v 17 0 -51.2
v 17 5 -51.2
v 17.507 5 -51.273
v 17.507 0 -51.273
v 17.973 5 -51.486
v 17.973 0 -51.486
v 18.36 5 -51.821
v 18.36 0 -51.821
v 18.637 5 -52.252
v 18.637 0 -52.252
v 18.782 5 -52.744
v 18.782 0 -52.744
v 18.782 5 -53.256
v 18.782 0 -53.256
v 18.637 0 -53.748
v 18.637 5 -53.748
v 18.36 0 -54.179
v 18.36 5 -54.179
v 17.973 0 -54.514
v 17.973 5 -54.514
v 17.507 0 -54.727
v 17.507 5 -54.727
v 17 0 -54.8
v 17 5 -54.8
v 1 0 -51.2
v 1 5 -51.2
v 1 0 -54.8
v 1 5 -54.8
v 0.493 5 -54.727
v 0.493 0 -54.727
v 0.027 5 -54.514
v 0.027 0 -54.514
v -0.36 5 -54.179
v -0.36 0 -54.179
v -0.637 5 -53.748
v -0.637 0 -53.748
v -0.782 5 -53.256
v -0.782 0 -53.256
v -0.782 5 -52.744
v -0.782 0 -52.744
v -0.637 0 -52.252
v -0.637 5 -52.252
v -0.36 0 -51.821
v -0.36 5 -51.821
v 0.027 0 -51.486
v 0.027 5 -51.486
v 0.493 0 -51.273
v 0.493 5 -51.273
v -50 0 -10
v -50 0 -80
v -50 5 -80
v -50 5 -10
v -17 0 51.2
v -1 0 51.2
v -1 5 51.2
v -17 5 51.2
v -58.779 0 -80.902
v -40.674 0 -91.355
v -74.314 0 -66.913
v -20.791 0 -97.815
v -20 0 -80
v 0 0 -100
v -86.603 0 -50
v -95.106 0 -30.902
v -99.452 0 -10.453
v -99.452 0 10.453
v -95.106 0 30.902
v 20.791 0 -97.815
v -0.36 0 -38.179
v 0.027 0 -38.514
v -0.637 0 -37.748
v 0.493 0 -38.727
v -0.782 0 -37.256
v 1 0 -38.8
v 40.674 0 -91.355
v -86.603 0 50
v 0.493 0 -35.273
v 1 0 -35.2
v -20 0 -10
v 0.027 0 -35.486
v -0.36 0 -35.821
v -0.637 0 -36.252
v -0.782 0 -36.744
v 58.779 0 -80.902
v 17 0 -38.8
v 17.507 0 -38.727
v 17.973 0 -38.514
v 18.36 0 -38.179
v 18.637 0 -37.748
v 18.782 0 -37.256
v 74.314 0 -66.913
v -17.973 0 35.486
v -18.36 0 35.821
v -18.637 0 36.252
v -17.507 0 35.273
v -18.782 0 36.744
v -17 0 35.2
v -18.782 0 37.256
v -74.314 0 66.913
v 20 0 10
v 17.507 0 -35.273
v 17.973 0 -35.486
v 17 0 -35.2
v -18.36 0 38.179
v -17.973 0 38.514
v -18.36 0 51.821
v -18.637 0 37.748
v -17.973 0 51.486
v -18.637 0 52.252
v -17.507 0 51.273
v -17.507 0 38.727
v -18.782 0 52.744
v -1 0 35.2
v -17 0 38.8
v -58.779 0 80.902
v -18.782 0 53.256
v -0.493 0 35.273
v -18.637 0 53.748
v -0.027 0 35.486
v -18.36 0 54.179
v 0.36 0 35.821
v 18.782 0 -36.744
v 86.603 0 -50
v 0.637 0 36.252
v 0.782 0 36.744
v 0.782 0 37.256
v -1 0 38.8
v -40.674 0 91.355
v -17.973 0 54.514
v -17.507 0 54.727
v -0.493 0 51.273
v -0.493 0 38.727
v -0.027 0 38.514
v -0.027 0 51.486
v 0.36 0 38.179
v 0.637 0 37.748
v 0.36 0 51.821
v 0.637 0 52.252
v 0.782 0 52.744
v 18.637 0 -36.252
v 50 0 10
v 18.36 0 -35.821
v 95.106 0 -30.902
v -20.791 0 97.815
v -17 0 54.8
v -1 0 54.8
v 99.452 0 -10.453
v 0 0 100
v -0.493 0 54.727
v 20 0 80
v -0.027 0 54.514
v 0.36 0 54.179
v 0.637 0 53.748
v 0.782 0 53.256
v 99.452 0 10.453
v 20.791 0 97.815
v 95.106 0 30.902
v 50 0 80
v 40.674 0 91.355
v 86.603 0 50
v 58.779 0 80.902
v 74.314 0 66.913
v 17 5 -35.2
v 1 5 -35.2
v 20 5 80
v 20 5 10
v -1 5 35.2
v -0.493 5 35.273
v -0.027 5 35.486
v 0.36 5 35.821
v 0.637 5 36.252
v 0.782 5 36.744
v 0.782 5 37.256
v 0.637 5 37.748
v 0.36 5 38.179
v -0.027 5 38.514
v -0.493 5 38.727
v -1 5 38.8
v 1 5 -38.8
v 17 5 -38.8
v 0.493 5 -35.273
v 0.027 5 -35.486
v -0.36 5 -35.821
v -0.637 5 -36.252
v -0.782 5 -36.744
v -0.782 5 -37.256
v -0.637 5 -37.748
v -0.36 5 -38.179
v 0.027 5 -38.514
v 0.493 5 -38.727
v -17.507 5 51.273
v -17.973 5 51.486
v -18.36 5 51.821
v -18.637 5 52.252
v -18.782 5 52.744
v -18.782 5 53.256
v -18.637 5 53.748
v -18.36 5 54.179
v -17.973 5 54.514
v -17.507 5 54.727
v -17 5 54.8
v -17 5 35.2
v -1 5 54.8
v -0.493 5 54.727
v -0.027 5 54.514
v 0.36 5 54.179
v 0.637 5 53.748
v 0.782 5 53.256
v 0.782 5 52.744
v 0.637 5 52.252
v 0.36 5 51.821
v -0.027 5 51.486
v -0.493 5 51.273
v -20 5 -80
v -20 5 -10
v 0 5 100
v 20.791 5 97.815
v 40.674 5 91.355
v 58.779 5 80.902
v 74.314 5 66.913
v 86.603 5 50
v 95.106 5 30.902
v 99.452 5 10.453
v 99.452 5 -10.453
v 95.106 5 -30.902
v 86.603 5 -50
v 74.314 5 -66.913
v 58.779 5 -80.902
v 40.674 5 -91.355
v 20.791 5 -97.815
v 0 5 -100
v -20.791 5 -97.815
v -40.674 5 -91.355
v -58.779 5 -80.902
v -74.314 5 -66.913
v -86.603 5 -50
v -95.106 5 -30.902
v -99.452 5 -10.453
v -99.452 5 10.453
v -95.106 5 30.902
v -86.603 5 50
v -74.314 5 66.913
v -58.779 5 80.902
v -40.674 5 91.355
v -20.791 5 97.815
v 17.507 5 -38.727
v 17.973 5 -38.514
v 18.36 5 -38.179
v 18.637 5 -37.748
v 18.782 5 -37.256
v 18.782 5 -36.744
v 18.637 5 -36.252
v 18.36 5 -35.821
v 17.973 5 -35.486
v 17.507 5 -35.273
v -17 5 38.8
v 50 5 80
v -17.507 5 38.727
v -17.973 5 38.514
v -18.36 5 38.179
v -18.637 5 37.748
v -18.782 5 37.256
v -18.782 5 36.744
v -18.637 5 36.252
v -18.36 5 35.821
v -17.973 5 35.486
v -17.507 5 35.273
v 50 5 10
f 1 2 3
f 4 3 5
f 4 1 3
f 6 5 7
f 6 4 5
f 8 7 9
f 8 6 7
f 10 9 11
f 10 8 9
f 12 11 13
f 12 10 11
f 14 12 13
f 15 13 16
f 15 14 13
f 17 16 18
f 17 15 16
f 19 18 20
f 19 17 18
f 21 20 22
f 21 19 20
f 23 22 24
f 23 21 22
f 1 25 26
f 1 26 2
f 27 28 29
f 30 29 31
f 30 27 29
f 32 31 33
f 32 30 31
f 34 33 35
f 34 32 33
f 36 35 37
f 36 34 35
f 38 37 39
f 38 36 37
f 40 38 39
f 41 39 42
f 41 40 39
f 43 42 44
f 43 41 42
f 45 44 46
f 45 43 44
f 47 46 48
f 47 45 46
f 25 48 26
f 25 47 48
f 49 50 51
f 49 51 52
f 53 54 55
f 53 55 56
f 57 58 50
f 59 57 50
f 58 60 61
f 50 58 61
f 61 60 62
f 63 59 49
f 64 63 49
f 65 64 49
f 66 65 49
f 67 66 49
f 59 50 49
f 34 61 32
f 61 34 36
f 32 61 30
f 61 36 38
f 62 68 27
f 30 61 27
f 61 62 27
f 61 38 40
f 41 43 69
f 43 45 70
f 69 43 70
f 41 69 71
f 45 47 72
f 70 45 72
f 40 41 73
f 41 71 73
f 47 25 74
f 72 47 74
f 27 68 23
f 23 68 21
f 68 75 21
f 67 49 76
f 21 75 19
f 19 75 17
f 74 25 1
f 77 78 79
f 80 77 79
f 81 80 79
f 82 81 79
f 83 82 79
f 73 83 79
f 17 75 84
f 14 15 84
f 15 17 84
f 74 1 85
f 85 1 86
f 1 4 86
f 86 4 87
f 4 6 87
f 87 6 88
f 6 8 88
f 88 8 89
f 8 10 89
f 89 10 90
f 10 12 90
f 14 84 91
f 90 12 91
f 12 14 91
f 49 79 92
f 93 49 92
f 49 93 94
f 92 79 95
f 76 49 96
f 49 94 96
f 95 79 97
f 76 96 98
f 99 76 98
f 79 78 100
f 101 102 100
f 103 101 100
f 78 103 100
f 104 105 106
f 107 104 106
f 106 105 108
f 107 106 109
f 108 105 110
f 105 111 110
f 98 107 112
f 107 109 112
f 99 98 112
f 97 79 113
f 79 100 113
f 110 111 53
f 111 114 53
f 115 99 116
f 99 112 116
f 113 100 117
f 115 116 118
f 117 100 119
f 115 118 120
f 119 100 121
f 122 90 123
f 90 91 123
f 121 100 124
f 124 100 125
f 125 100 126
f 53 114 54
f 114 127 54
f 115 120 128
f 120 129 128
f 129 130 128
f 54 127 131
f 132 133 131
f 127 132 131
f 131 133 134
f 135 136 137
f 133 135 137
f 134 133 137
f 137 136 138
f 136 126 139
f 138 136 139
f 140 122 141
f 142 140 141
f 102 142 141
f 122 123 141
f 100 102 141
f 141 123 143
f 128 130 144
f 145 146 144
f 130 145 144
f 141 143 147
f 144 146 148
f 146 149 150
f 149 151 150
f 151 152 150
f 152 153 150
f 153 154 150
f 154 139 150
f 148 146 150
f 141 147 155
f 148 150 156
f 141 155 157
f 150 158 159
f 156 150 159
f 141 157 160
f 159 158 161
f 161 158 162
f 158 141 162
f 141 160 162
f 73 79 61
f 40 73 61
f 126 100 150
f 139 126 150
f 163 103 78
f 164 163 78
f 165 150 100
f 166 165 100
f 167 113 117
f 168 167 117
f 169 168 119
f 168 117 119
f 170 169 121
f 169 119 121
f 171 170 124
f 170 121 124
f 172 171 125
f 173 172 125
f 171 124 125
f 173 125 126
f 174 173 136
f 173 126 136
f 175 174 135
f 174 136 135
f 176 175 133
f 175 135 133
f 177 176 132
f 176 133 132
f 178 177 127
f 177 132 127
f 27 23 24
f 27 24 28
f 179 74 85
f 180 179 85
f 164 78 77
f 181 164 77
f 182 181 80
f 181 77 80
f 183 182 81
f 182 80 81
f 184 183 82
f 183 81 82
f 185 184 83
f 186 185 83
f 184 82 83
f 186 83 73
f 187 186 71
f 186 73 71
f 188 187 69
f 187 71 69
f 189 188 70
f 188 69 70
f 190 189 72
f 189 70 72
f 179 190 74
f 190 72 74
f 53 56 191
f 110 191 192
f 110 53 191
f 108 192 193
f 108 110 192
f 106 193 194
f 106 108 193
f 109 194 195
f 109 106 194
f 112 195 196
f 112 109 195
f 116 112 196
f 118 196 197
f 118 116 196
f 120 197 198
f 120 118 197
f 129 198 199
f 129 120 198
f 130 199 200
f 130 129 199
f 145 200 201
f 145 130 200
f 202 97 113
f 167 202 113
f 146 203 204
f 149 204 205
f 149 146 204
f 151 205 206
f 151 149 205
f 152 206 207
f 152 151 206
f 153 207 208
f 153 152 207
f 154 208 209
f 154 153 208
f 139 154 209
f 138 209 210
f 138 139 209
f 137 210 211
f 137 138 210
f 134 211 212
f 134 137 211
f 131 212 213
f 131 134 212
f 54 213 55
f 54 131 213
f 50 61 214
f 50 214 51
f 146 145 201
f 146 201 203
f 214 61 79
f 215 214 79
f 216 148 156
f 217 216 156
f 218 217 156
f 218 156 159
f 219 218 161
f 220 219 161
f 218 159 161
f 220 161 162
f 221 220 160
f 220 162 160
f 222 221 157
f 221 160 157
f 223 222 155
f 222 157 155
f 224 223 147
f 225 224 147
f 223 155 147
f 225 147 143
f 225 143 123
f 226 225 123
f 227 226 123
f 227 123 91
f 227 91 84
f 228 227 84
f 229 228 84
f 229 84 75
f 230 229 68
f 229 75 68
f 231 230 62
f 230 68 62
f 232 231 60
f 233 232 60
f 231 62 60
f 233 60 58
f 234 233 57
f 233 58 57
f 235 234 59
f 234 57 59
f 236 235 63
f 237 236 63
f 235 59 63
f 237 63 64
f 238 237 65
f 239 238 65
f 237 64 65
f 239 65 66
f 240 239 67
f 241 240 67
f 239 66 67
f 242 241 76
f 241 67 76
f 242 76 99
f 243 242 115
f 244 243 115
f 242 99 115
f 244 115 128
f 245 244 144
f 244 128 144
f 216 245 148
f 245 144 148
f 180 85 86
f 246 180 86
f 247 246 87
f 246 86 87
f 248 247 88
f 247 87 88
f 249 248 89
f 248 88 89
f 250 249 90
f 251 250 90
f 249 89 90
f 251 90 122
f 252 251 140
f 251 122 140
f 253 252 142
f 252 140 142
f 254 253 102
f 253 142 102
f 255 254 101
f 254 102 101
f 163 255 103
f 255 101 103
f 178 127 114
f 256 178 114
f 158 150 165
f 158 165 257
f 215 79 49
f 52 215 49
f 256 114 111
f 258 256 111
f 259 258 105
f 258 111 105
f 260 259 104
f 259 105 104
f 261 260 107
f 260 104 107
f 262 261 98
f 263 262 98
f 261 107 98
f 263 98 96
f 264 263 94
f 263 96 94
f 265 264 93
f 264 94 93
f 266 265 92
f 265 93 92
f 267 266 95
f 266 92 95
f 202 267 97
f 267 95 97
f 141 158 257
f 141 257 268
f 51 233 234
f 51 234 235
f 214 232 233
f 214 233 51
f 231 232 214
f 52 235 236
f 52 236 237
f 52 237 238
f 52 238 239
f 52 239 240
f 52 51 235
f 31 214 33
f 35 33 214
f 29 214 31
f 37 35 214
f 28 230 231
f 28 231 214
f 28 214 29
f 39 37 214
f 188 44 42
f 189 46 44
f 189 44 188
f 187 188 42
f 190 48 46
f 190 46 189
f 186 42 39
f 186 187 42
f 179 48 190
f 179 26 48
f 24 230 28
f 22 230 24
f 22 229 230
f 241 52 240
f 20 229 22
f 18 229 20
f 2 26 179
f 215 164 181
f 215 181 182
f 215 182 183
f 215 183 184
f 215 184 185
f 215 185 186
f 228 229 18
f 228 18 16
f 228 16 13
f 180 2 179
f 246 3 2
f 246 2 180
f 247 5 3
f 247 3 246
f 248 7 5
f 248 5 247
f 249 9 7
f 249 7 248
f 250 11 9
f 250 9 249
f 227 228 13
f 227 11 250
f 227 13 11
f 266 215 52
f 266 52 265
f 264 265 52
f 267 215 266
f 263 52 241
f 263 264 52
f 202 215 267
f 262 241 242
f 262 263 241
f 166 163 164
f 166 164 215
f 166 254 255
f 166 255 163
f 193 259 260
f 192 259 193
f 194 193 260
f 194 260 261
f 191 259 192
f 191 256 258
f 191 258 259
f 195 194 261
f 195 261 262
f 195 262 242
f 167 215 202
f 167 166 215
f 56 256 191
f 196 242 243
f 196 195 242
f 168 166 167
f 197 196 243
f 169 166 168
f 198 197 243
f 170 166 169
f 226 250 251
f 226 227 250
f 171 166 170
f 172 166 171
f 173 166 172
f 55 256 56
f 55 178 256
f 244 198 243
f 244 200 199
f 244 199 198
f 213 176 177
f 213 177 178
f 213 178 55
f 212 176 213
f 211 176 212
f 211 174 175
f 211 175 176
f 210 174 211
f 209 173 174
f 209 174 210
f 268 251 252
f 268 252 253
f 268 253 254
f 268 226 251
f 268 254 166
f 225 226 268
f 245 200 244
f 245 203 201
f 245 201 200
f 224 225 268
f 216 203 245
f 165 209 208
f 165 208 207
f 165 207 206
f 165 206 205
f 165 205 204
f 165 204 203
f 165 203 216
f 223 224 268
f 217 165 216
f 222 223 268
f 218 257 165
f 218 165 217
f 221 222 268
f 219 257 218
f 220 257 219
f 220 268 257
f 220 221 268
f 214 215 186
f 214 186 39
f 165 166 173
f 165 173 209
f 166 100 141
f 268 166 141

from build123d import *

# Parameters (mm, degrees)
SKETCH_1_R               = 100
EXTRUDE_1_DEPTH          = 5
SKETCH_3_W               = 30
SKETCH_3_H               = 70
CUT_EXTRUDE_1_DEPTH      = 142.509716981
CUT_EXTRUDE_2_DEPTH      = 142.509716981
PATTERN_CIRCULAR_1_COUNT = 2


with BuildPart() as part:
    # 草图1 → 凸台-拉伸1 (new body)
    with BuildSketch(Plane(origin=(0, 0, 0), x_dir=(1, 0, 0), z_dir=(0, 1, 0))):
        with Locations(Location((0, 0, 0), (0, 0, 270))):
            Circle(SKETCH_1_R)
    extrude(amount=EXTRUDE_1_DEPTH)

    # 草图3 → 切除-拉伸1 (cut, through all)
    with BuildSketch(Plane(origin=(0, 0, 0), x_dir=(1, 0, 0), z_dir=(0, 1, 0))):
        with Locations((35, -45)):
            Rectangle(SKETCH_3_W, SKETCH_3_H)
    cut_extrude_1 = extrude(amount=CUT_EXTRUDE_1_DEPTH, mode=Mode.SUBTRACT)

    # 草图2 → 切除-拉伸2 (cut, through all)
    with BuildSketch(Plane(origin=(0, 0, 0), x_dir=(1, 0, 0), z_dir=(0, 1, 0))):
        with BuildLine():
            Line((-17, -35.2), (-1, -35.2))
            ThreePointArc((-1, -35.2), (0.8, -37), (-1, -38.8))
            Line((-1, -38.8), (-17, -38.8))
            ThreePointArc((-17, -38.8), (-18.8, -37), (-17, -35.2))
        make_face()
        with BuildLine():
            Line((-17, -54.8), (-1, -54.8))
            ThreePointArc((-1, -54.8), (0.8, -53), (-1, -51.2))
            Line((-1, -51.2), (-17, -51.2))
            ThreePointArc((-17, -51.2), (-18.8, -53), (-17, -54.8))
        make_face()
    cut_extrude_2 = extrude(amount=CUT_EXTRUDE_2_DEPTH, mode=Mode.SUBTRACT)

    # 阵列(圆周)1: 切除-拉伸1, 切除-拉伸2 ×2 about axis
    pattern_circular_1_axis = Axis((0, 0, 0), (0, 1, 0))
    add([cut_extrude_1.rotate(pattern_circular_1_axis, i * 360 / PATTERN_CIRCULAR_1_COUNT) for i in range(1, PATTERN_CIRCULAR_1_COUNT)], mode=Mode.SUBTRACT)
    add([cut_extrude_2.rotate(pattern_circular_1_axis, i * 360 / PATTERN_CIRCULAR_1_COUNT) for i in range(1, PATTERN_CIRCULAR_1_COUNT)], mode=Mode.SUBTRACT)


solid = part.part
